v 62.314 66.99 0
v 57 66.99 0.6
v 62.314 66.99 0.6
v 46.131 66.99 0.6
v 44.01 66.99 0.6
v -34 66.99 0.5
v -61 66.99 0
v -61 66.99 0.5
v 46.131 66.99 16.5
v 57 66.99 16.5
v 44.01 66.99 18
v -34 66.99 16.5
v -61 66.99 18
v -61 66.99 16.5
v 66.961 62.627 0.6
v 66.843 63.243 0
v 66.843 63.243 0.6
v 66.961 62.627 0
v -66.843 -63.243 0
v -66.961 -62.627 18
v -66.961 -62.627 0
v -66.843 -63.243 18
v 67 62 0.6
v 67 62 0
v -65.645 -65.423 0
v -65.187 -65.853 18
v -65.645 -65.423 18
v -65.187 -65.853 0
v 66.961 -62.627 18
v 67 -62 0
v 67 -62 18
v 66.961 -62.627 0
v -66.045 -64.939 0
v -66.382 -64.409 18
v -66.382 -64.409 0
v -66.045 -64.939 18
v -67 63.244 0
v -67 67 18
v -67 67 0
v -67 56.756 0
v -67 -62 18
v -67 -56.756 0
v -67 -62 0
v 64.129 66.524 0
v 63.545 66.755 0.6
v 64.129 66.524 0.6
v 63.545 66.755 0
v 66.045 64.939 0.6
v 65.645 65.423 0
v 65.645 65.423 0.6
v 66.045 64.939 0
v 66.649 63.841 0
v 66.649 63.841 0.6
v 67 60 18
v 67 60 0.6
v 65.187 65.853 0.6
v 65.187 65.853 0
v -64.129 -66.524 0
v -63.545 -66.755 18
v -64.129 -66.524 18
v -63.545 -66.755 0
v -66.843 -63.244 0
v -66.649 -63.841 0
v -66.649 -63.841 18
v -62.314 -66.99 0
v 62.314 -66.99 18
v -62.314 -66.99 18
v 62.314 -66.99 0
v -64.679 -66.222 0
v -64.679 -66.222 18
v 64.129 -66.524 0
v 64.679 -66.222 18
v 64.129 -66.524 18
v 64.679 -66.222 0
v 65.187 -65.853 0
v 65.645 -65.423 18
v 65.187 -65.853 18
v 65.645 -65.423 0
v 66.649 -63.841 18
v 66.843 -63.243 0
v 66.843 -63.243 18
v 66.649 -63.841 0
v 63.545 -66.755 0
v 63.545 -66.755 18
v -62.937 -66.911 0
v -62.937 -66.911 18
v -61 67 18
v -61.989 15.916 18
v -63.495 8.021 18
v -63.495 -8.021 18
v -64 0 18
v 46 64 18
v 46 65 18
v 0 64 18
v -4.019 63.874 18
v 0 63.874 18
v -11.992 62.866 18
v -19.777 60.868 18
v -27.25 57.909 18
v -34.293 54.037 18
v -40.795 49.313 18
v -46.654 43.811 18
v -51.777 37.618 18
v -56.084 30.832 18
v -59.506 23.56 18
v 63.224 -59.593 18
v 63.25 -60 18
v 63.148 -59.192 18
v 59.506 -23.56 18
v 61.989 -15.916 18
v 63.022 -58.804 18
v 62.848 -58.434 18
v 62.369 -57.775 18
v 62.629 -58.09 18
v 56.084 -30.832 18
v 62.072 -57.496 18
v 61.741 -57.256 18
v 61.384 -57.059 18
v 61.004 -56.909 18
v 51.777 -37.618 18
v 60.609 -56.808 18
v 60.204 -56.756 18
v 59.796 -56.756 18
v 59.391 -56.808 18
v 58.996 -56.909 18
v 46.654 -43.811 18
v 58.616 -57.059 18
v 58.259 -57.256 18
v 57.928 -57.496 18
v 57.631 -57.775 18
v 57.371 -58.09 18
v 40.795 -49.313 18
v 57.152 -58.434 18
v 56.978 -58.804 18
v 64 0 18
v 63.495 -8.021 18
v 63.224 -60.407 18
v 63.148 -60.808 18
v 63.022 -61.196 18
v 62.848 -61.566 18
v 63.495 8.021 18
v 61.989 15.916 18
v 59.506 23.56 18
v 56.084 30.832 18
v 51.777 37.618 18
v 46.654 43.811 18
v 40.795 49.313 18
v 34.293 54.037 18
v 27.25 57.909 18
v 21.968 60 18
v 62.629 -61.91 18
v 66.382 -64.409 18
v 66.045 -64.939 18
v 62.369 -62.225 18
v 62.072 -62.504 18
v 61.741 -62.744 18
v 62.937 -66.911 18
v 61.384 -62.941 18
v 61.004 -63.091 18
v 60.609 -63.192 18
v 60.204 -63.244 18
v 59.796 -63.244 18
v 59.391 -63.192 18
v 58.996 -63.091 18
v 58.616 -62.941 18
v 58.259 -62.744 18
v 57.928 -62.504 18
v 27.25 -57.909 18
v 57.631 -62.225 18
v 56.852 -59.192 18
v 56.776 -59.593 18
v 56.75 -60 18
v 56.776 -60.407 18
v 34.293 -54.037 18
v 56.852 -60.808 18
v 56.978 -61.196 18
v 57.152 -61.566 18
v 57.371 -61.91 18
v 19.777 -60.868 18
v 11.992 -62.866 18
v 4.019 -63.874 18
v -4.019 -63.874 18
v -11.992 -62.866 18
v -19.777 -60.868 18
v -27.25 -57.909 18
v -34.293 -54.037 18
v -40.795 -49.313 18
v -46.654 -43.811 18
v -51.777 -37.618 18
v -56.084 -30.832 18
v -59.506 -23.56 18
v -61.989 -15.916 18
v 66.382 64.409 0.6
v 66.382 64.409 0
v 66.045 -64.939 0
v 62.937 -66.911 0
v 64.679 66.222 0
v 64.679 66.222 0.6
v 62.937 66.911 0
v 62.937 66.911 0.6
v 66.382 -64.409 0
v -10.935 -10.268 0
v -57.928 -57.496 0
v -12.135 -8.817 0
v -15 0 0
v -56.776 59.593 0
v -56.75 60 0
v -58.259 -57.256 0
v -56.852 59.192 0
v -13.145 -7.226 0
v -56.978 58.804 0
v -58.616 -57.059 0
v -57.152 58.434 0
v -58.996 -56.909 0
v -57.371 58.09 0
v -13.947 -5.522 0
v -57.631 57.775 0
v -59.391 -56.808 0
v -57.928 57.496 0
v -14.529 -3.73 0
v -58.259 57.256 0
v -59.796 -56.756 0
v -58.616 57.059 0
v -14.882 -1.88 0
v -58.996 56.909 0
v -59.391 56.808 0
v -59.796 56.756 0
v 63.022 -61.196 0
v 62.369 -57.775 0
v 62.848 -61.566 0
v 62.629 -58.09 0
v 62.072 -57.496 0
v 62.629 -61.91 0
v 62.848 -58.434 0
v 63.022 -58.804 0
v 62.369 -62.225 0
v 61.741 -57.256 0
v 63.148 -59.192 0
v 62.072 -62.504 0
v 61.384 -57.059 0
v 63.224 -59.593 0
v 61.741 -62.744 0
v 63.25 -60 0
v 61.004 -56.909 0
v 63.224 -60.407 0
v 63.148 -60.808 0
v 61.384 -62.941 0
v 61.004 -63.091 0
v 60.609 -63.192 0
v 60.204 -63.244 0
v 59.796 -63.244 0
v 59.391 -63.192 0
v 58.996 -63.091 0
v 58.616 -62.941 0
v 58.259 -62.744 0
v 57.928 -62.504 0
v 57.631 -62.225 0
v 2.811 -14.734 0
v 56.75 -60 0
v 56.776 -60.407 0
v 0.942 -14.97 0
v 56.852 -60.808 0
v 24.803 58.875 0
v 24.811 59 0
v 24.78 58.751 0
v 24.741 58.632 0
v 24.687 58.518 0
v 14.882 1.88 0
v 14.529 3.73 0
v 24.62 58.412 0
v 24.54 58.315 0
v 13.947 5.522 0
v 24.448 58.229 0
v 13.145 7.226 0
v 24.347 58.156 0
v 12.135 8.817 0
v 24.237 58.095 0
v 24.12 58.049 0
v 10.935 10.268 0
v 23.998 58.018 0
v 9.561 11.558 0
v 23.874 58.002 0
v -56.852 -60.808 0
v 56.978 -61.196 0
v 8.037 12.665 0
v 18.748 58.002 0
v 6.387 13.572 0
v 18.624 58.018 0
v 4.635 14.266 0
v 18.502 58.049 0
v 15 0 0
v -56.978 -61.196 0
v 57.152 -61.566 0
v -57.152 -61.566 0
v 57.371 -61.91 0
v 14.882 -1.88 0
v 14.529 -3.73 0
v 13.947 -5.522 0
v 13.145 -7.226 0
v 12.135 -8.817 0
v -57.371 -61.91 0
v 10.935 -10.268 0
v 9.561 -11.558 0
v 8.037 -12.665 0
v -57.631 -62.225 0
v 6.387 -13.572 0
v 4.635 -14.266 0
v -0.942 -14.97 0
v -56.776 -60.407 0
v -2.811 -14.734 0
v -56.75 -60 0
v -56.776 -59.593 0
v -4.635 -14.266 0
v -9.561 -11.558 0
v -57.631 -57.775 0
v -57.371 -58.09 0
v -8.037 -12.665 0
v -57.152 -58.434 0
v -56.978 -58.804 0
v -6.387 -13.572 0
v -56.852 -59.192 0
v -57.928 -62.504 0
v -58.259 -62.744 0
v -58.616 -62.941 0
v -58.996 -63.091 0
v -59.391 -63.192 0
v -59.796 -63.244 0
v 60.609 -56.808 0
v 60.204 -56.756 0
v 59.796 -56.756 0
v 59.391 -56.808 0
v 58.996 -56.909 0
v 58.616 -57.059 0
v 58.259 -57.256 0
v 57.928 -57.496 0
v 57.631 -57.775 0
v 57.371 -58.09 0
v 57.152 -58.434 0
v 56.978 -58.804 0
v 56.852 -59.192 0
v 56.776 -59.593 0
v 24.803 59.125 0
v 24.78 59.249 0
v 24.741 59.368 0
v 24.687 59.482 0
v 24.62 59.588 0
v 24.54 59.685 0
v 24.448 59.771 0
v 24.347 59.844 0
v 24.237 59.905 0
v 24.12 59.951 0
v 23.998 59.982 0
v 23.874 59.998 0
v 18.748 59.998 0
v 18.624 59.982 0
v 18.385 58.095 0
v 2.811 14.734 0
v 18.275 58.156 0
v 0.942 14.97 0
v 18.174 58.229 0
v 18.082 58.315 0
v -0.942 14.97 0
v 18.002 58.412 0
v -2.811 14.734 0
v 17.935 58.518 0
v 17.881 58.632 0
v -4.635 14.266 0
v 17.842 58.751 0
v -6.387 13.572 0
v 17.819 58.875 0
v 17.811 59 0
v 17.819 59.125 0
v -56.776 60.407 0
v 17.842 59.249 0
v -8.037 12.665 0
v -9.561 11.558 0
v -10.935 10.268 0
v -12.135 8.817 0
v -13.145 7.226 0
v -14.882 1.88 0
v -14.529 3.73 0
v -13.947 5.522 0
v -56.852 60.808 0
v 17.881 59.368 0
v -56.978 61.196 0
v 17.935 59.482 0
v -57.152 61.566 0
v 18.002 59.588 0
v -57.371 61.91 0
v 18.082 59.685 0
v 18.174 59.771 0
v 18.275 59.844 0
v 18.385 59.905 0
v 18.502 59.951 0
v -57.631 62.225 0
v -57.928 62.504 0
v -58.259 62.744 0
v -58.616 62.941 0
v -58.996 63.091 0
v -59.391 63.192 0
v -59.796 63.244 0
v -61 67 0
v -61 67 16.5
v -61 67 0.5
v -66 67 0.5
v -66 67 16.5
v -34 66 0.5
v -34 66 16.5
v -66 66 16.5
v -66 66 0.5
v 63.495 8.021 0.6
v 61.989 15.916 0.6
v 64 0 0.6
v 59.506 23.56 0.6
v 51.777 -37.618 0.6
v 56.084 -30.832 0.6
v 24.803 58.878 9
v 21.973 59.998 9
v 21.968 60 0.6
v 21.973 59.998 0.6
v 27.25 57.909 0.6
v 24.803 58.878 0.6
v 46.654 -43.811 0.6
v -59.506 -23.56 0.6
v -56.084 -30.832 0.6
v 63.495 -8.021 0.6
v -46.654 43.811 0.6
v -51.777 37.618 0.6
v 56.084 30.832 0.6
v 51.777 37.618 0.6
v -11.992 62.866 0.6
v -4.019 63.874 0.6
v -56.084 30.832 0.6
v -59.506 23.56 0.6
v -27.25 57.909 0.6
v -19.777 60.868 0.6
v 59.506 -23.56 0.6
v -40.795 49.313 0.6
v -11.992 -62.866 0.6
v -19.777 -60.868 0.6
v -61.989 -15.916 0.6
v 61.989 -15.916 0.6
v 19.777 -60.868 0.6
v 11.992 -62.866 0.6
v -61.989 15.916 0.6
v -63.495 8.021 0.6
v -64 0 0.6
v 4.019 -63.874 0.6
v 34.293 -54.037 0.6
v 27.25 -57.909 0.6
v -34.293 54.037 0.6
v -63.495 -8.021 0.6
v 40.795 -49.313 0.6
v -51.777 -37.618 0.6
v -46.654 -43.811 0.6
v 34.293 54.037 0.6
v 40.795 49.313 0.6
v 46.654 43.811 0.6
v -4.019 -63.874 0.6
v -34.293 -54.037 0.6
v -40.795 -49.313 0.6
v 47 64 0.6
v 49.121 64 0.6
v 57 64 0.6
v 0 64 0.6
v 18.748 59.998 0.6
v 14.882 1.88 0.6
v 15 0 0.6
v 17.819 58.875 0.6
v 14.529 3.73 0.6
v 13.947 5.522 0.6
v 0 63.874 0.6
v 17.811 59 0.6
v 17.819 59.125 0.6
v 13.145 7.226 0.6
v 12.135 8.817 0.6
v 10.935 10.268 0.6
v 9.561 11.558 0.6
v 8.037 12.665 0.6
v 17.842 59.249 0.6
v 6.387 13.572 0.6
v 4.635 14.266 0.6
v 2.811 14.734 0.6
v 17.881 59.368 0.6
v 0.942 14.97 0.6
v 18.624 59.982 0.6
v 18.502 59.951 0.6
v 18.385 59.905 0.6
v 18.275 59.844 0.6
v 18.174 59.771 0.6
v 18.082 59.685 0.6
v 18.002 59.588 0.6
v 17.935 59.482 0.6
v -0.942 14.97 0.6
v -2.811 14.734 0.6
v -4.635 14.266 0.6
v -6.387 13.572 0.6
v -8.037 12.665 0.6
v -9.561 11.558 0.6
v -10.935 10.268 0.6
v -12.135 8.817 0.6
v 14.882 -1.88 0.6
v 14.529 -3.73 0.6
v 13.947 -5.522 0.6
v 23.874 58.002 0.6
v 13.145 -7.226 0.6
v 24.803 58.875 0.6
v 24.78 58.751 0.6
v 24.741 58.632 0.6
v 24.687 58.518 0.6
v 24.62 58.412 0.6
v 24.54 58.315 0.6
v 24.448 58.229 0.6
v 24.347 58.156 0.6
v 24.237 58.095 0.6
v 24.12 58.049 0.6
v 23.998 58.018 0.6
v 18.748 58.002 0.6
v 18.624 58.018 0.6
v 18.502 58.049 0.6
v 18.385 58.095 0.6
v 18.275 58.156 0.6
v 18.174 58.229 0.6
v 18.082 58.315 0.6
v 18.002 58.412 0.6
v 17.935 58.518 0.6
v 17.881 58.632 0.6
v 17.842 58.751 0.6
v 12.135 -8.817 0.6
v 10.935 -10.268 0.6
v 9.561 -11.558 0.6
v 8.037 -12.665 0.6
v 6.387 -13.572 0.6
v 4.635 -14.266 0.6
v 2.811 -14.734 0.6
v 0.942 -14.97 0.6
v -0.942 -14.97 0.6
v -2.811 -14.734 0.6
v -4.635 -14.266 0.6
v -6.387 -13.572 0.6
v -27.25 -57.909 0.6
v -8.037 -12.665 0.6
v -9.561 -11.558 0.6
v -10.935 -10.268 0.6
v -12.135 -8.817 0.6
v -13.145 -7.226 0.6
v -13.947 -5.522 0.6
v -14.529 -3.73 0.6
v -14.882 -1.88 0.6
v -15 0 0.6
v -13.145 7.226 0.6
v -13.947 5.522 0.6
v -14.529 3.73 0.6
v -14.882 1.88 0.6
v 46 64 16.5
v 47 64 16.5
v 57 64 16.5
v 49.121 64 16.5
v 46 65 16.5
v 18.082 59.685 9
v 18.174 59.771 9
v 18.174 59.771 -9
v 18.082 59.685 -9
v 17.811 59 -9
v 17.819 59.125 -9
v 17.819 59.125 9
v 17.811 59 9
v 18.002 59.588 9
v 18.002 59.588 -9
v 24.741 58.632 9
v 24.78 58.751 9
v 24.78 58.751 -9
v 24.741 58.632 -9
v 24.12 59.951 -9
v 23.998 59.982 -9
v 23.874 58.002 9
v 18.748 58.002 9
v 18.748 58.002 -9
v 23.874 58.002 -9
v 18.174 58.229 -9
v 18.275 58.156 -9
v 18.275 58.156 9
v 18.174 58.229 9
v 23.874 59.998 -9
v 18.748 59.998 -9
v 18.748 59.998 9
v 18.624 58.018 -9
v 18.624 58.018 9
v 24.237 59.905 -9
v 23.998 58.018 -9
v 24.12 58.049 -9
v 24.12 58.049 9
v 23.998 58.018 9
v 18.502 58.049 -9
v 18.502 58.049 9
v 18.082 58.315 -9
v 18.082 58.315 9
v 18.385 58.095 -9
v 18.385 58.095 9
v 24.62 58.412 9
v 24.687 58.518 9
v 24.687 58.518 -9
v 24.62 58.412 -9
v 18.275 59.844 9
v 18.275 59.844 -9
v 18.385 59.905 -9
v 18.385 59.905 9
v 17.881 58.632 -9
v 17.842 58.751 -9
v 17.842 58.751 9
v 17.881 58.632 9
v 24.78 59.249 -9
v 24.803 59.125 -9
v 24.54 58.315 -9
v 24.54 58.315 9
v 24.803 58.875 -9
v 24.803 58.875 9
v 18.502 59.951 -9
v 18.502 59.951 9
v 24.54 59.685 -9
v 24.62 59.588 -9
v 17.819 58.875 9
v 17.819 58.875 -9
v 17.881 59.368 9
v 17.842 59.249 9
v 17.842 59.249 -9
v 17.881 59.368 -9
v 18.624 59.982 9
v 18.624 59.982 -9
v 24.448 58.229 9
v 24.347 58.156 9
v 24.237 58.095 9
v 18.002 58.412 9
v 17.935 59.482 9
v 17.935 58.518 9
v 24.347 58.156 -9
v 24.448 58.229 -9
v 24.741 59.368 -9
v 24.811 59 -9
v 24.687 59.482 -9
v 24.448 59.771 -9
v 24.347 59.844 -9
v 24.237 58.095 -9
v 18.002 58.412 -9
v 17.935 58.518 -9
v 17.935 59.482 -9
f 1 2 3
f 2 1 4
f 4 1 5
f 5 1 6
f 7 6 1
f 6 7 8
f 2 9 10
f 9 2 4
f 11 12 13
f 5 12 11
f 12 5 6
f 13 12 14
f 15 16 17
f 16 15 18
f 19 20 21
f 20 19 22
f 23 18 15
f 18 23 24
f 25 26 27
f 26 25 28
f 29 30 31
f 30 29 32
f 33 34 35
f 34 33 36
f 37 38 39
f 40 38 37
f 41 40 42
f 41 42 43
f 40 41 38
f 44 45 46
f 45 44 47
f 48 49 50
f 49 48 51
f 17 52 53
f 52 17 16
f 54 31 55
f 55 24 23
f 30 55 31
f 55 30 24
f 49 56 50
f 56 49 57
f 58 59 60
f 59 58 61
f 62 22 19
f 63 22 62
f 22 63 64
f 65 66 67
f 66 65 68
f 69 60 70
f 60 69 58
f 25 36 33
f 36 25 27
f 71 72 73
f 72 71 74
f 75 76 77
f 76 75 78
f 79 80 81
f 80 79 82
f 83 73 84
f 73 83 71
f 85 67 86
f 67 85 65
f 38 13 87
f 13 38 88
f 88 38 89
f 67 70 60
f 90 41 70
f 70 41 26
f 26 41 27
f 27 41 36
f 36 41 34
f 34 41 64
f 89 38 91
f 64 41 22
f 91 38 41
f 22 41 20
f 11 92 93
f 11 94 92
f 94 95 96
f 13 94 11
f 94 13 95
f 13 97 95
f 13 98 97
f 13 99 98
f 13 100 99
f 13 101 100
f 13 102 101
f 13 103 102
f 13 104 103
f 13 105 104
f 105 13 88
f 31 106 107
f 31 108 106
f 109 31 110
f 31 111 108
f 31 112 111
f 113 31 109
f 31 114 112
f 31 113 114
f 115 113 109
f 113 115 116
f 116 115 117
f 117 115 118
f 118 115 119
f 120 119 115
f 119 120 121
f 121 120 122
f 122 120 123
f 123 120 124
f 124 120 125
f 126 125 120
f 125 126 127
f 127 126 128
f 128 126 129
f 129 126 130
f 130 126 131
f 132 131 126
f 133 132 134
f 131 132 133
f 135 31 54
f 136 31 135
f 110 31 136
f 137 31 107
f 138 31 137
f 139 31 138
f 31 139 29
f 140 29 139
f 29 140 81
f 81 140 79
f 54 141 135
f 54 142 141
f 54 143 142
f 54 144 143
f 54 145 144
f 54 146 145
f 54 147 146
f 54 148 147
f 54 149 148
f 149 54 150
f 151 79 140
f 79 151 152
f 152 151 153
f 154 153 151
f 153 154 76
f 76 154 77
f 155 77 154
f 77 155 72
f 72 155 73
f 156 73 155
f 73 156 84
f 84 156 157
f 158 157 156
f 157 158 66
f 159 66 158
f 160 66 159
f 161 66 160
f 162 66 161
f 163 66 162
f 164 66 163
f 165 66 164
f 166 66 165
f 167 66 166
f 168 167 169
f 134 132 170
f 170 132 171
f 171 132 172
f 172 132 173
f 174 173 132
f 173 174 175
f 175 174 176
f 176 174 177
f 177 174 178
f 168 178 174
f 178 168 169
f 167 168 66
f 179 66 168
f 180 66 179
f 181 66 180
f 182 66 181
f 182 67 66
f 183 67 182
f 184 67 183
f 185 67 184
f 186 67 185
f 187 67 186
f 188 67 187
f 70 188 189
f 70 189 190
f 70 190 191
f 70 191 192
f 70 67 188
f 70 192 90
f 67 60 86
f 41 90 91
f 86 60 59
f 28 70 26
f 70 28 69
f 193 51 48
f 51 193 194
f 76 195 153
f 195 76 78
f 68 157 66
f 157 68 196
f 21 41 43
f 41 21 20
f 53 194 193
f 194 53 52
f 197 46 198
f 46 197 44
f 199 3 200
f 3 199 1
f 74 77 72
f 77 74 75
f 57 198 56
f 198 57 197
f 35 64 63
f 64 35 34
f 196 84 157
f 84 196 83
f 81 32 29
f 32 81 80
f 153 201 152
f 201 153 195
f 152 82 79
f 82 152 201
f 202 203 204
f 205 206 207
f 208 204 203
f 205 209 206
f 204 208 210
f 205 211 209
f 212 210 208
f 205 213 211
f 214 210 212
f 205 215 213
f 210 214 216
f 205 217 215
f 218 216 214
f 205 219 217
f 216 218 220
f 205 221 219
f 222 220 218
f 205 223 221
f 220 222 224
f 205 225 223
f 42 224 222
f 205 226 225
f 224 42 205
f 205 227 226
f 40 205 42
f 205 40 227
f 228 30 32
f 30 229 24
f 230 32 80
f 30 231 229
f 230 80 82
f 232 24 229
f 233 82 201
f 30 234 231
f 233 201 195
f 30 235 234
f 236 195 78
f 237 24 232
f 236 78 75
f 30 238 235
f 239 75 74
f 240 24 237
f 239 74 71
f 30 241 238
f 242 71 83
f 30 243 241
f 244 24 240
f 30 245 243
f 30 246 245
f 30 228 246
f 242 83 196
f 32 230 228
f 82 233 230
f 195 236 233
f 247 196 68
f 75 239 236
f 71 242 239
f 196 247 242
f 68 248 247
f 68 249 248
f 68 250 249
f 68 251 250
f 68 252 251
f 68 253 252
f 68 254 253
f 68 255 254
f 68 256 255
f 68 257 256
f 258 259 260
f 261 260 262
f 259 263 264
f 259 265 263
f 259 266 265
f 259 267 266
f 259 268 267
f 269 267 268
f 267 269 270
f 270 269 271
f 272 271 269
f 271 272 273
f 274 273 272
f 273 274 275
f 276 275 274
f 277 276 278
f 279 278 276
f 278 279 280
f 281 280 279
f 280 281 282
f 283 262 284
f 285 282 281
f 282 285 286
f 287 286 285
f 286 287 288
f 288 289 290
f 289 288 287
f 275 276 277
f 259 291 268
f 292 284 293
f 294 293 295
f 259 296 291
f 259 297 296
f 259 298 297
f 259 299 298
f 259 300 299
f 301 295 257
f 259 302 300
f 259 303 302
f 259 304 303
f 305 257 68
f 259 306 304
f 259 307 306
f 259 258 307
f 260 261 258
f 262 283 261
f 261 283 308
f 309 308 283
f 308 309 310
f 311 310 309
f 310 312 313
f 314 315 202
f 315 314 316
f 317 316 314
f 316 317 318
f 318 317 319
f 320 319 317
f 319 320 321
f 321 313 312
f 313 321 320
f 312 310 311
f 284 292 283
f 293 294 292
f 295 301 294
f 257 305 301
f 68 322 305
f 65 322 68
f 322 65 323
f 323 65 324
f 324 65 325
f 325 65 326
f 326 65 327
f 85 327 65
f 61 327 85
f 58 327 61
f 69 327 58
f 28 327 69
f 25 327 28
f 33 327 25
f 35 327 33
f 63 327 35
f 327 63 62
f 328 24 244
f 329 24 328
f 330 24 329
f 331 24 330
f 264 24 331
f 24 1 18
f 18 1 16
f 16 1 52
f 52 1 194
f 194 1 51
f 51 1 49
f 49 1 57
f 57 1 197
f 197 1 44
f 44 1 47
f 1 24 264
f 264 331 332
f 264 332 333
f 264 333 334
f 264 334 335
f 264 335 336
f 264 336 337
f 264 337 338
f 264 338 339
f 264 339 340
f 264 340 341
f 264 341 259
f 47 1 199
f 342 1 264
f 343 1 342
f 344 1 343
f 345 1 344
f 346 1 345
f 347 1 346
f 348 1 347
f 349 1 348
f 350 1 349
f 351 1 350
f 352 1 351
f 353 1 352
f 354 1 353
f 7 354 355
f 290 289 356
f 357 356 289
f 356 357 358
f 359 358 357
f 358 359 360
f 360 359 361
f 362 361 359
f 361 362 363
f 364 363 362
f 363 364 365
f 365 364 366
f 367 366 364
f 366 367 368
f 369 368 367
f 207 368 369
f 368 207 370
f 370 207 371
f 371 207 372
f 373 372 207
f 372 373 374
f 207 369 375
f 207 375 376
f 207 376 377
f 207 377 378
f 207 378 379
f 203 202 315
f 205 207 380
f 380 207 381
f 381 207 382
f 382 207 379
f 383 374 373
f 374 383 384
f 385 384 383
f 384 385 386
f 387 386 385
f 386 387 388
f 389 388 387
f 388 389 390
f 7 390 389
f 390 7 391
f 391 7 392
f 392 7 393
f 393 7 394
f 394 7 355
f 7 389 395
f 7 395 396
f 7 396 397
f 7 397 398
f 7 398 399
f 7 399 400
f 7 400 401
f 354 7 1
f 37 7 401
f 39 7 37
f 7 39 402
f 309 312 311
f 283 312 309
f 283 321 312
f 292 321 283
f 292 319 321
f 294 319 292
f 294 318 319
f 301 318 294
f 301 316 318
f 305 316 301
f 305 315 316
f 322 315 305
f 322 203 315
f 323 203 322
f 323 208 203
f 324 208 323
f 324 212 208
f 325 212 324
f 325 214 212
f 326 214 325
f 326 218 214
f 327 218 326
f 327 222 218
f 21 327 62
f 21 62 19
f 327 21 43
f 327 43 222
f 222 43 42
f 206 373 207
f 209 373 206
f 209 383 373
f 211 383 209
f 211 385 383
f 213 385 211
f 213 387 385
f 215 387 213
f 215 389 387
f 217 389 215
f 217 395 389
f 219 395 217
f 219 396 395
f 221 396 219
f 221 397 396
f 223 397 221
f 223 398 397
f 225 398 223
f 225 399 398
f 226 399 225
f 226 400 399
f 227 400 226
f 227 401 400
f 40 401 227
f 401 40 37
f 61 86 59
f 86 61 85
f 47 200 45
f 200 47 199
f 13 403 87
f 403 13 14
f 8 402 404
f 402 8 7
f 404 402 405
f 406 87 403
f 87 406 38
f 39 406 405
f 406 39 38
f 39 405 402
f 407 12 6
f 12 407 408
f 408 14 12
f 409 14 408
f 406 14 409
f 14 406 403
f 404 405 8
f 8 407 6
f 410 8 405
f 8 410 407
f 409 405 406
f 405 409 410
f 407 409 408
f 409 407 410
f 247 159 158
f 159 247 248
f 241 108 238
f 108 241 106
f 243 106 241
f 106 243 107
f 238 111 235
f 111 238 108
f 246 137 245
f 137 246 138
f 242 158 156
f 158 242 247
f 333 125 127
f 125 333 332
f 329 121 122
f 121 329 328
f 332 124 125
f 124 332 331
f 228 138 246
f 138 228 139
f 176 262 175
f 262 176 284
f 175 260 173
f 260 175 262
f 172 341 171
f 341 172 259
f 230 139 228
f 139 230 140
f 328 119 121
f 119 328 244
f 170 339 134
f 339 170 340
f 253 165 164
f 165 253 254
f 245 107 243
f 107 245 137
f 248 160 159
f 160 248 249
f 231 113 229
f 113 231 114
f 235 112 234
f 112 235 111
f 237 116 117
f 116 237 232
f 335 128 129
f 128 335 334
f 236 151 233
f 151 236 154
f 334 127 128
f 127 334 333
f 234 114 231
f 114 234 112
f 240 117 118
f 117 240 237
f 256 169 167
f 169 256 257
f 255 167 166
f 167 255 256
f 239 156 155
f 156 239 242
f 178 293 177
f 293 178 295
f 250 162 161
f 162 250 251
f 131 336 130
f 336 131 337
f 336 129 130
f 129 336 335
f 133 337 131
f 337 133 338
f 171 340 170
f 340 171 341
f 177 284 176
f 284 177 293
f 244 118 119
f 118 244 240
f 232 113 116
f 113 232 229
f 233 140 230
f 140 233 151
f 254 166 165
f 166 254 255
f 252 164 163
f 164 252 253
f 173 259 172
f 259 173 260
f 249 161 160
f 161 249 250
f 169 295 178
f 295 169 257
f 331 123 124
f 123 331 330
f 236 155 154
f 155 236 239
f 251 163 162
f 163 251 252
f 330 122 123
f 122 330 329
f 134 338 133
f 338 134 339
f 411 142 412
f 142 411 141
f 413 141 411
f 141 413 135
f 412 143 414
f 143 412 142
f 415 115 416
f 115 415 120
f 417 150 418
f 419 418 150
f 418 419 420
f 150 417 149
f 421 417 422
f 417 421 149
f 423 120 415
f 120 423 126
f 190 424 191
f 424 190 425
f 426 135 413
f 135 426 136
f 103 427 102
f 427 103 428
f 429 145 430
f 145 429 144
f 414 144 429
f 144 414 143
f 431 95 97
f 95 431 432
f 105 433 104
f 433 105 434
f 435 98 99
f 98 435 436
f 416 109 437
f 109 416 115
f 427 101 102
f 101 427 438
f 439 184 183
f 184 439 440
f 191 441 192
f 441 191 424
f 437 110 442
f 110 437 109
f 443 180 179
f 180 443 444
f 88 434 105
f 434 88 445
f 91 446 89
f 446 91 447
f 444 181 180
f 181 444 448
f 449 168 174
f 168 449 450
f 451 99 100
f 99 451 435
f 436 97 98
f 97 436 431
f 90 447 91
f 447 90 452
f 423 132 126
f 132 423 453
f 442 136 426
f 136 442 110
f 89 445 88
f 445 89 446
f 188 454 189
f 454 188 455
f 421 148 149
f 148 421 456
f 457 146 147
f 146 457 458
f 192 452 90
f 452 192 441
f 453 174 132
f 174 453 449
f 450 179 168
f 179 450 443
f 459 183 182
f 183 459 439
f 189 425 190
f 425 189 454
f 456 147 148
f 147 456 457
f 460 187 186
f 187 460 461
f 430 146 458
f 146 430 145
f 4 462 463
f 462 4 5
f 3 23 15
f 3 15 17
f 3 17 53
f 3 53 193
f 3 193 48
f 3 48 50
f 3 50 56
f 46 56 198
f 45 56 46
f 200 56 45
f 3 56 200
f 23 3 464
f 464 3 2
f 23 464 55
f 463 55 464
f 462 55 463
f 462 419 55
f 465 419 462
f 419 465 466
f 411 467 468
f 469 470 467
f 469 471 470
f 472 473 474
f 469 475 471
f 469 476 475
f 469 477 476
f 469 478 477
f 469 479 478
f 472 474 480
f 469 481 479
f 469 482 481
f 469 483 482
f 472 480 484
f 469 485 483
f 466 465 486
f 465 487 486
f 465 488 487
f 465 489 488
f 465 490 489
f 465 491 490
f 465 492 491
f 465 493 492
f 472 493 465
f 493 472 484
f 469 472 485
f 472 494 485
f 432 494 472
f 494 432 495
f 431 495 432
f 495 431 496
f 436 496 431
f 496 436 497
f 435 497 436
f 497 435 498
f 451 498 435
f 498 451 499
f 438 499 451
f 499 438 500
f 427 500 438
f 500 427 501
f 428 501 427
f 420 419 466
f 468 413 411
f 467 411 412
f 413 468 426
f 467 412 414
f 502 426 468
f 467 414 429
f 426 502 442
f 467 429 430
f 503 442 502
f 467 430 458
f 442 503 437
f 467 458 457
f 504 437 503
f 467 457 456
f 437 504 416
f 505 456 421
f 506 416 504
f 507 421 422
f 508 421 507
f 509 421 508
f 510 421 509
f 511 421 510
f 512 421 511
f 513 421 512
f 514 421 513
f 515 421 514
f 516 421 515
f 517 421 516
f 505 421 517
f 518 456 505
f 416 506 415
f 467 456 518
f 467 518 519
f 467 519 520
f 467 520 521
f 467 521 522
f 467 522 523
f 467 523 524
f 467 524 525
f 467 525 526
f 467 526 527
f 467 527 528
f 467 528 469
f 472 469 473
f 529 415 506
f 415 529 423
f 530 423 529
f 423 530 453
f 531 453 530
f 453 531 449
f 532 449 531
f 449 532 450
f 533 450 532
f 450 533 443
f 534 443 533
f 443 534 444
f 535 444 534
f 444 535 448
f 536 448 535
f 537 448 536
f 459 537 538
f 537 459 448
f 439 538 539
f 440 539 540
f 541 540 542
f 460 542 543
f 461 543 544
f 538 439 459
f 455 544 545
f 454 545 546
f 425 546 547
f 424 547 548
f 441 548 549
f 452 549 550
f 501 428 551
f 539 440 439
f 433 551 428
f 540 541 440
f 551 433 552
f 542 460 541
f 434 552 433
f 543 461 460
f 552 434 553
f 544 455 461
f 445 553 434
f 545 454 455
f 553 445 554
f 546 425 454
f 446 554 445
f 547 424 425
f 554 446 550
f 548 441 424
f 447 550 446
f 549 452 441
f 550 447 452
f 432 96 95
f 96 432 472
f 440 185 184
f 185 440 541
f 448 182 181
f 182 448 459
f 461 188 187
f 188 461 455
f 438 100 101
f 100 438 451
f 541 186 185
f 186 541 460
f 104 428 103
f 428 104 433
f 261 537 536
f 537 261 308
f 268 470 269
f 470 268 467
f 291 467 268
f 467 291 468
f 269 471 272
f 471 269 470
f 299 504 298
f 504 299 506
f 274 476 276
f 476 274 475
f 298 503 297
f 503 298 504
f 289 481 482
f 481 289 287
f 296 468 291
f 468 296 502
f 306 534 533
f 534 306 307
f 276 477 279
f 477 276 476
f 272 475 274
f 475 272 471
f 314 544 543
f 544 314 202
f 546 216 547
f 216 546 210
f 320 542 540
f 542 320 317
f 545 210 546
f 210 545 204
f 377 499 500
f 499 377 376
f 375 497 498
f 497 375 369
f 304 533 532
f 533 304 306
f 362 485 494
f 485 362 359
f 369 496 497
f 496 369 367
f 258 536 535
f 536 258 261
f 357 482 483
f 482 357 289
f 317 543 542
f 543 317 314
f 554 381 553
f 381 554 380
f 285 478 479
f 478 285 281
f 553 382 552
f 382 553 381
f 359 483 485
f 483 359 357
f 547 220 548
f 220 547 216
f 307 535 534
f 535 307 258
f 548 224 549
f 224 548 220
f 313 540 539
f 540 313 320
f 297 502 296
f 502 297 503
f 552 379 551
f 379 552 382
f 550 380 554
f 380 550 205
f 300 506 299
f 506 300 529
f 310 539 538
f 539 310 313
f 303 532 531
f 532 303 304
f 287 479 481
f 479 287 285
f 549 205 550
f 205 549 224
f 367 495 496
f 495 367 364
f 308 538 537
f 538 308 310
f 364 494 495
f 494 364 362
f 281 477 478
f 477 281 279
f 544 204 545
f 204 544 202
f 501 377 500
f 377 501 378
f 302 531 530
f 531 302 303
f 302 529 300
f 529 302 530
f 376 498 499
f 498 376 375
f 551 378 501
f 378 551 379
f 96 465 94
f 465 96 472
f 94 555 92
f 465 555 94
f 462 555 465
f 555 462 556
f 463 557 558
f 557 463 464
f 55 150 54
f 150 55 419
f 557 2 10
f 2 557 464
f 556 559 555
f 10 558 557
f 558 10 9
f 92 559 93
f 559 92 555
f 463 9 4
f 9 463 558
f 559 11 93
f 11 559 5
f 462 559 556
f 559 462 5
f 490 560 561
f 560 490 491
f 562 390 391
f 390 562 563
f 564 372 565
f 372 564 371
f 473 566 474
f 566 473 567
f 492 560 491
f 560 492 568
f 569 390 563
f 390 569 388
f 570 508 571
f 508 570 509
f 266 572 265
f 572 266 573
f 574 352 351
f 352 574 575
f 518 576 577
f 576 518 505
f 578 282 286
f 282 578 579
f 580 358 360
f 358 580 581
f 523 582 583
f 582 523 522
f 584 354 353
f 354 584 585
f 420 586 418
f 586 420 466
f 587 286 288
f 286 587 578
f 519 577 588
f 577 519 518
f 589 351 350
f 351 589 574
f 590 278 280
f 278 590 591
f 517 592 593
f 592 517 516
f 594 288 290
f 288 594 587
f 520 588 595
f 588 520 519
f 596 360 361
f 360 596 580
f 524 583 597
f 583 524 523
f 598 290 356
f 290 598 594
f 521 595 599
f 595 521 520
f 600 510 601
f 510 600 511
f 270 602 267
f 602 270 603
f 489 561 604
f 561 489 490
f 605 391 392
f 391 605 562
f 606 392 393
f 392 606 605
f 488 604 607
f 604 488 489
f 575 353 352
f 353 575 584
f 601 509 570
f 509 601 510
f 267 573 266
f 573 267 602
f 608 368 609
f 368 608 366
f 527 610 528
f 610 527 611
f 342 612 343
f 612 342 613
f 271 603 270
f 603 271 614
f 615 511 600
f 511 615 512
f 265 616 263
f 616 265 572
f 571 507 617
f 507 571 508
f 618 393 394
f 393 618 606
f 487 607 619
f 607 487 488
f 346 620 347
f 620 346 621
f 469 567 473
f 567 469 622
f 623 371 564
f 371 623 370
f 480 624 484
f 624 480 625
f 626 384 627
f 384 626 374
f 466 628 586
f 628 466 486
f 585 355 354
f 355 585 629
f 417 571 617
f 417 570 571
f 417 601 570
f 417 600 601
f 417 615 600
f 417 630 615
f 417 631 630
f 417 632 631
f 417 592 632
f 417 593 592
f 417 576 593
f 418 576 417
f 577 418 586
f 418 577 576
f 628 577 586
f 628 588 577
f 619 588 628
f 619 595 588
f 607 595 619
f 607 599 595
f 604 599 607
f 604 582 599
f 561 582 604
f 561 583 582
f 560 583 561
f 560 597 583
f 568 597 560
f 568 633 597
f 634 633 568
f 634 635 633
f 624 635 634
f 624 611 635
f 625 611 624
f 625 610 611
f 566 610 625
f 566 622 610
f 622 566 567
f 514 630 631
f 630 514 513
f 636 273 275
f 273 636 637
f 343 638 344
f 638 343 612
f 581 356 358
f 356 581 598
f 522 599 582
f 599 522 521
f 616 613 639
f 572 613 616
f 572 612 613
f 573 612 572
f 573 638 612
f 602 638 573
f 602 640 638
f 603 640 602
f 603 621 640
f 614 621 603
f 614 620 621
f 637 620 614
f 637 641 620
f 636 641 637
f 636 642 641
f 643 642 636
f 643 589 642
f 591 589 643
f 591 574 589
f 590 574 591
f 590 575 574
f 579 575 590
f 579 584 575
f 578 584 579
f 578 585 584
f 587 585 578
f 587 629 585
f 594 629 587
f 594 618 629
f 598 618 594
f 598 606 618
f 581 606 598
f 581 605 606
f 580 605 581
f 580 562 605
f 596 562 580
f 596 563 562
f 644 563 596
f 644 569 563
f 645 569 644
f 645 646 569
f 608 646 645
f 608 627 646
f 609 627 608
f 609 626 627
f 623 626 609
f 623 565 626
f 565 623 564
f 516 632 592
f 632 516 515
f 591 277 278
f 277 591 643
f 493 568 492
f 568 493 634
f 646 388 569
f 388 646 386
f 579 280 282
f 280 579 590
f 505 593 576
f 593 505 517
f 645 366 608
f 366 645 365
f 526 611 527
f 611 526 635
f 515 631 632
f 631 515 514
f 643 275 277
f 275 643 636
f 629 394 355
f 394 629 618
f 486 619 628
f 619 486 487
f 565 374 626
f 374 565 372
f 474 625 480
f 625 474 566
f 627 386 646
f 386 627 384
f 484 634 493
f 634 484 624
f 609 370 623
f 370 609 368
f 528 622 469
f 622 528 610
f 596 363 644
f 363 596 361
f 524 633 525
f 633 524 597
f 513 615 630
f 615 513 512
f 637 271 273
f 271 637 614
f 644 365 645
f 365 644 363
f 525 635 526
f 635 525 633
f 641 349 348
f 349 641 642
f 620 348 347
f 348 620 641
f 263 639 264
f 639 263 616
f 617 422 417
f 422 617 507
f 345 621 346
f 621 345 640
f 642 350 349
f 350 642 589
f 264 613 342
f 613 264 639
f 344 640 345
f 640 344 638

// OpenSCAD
$fn = 50;


union() {
	difference() {
		union() {
			hull() {
				translate(v = [-62.0000000000, 62.0000000000, 0]) {
					cylinder(h = 18, r = 5);
				}
				translate(v = [62.0000000000, 62.0000000000, 0]) {
					cylinder(h = 18, r = 5);
				}
				translate(v = [-62.0000000000, -62.0000000000, 0]) {
					cylinder(h = 18, r = 5);
				}
				translate(v = [62.0000000000, -62.0000000000, 0]) {
					cylinder(h = 18, r = 5);
				}
			}
			translate(v = [-67.0000000000, 61.0000000000, 0]) {
				cube(size = [6, 6, 18]);
			}
		}
		union() {
			translate(v = [-67.5000000000, -60.0000000000, -250.0000000000]) {
				rotate(a = [0, 0, 0]) {
					difference() {
						union() {
							hull() {
								translate(v = [7.5000000000, 0, 0]) {
									cylinder(h = 250, r = 3.2500000000, r1 = 3.2500000000, r2 = 3.2500000000);
								}
								translate(v = [-7.5000000000, 0, 0]) {
									cylinder(h = 250, r = 3.2500000000, r1 = 3.2500000000, r2 = 3.2500000000);
								}
							}
						}
						union();
					}
				}
			}
			translate(v = [-67.5000000000, 60.0000000000, -250.0000000000]) {
				rotate(a = [0, 0, 0]) {
					difference() {
						union() {
							hull() {
								translate(v = [7.5000000000, 0, 0]) {
									cylinder(h = 250, r = 3.2500000000, r1 = 3.2500000000, r2 = 3.2500000000);
								}
								translate(v = [-7.5000000000, 0, 0]) {
									cylinder(h = 250, r = 3.2500000000, r1 = 3.2500000000, r2 = 3.2500000000);
								}
							}
						}
						union();
					}
				}
			}
			translate(v = [-66.0000000000, 66.0000000000, 0.5000000000]) {
				cube(size = [32, 1, 16]);
			}
			translate(v = [60.0000000000, -60.0000000000, 0]) {
				cylinder(h = 100, r = 3.2500000000);
			}
			translate(v = [0, 0, 0.6000000000]) {
				cylinder(h = 20.4000000000, r = 64.0000000000);
			}
			translate(v = [0, 0, -9.0000000000]) {
				cylinder(h = 18, r = 15.0000000000);
			}
			translate(v = [0.0000000000, 60.0000000000, 0.6000000000]) {
				cube(size = [67.0000000000, 4, 20.4000000000]);
			}
			translate(v = [57.0000000000, 60.0000000000, 0.6000000000]) {
				cube(size = [10, 7, 20.4000000000]);
			}
			translate(v = [46.0000000000, 60.0000000000, 16.5000000000]) {
				cube(size = [21, 7, 1.5000000000]);
			}
			translate(v = [43.2500000000, 67.7500000000, 0.6000000000]) {
				rotate(a = [0, 0, -45]) {
					cube(size = [7.5000000000, 1.5000000000, 20.4000000000]);
				}
			}
			translate(v = [12.0610000000, 58.0000000000, 0.6000000000]) {
				cube(size = [7.5000000000, 2, 17.4000000000]);
			}
		}
	}
	union() {
		translate(v = [21.3110000000, 59.0000000000, -9.0000000000]) {
			rotate(a = [0, 0, 0]) {
				difference() {
					union() {
						#hull() {
							#translate(v = [2.5000000000, 0, 0]) {
								cylinder(h = 18, r = 1.0000000000, r1 = 1.0000000000, r2 = 1.0000000000);
							}
							#translate(v = [-2.5000000000, 0, 0]) {
								cylinder(h = 18, r = 1.0000000000, r1 = 1.0000000000, r2 = 1.0000000000);
							}
						}
					}
					union();
				}
			}
		}
	}
}
